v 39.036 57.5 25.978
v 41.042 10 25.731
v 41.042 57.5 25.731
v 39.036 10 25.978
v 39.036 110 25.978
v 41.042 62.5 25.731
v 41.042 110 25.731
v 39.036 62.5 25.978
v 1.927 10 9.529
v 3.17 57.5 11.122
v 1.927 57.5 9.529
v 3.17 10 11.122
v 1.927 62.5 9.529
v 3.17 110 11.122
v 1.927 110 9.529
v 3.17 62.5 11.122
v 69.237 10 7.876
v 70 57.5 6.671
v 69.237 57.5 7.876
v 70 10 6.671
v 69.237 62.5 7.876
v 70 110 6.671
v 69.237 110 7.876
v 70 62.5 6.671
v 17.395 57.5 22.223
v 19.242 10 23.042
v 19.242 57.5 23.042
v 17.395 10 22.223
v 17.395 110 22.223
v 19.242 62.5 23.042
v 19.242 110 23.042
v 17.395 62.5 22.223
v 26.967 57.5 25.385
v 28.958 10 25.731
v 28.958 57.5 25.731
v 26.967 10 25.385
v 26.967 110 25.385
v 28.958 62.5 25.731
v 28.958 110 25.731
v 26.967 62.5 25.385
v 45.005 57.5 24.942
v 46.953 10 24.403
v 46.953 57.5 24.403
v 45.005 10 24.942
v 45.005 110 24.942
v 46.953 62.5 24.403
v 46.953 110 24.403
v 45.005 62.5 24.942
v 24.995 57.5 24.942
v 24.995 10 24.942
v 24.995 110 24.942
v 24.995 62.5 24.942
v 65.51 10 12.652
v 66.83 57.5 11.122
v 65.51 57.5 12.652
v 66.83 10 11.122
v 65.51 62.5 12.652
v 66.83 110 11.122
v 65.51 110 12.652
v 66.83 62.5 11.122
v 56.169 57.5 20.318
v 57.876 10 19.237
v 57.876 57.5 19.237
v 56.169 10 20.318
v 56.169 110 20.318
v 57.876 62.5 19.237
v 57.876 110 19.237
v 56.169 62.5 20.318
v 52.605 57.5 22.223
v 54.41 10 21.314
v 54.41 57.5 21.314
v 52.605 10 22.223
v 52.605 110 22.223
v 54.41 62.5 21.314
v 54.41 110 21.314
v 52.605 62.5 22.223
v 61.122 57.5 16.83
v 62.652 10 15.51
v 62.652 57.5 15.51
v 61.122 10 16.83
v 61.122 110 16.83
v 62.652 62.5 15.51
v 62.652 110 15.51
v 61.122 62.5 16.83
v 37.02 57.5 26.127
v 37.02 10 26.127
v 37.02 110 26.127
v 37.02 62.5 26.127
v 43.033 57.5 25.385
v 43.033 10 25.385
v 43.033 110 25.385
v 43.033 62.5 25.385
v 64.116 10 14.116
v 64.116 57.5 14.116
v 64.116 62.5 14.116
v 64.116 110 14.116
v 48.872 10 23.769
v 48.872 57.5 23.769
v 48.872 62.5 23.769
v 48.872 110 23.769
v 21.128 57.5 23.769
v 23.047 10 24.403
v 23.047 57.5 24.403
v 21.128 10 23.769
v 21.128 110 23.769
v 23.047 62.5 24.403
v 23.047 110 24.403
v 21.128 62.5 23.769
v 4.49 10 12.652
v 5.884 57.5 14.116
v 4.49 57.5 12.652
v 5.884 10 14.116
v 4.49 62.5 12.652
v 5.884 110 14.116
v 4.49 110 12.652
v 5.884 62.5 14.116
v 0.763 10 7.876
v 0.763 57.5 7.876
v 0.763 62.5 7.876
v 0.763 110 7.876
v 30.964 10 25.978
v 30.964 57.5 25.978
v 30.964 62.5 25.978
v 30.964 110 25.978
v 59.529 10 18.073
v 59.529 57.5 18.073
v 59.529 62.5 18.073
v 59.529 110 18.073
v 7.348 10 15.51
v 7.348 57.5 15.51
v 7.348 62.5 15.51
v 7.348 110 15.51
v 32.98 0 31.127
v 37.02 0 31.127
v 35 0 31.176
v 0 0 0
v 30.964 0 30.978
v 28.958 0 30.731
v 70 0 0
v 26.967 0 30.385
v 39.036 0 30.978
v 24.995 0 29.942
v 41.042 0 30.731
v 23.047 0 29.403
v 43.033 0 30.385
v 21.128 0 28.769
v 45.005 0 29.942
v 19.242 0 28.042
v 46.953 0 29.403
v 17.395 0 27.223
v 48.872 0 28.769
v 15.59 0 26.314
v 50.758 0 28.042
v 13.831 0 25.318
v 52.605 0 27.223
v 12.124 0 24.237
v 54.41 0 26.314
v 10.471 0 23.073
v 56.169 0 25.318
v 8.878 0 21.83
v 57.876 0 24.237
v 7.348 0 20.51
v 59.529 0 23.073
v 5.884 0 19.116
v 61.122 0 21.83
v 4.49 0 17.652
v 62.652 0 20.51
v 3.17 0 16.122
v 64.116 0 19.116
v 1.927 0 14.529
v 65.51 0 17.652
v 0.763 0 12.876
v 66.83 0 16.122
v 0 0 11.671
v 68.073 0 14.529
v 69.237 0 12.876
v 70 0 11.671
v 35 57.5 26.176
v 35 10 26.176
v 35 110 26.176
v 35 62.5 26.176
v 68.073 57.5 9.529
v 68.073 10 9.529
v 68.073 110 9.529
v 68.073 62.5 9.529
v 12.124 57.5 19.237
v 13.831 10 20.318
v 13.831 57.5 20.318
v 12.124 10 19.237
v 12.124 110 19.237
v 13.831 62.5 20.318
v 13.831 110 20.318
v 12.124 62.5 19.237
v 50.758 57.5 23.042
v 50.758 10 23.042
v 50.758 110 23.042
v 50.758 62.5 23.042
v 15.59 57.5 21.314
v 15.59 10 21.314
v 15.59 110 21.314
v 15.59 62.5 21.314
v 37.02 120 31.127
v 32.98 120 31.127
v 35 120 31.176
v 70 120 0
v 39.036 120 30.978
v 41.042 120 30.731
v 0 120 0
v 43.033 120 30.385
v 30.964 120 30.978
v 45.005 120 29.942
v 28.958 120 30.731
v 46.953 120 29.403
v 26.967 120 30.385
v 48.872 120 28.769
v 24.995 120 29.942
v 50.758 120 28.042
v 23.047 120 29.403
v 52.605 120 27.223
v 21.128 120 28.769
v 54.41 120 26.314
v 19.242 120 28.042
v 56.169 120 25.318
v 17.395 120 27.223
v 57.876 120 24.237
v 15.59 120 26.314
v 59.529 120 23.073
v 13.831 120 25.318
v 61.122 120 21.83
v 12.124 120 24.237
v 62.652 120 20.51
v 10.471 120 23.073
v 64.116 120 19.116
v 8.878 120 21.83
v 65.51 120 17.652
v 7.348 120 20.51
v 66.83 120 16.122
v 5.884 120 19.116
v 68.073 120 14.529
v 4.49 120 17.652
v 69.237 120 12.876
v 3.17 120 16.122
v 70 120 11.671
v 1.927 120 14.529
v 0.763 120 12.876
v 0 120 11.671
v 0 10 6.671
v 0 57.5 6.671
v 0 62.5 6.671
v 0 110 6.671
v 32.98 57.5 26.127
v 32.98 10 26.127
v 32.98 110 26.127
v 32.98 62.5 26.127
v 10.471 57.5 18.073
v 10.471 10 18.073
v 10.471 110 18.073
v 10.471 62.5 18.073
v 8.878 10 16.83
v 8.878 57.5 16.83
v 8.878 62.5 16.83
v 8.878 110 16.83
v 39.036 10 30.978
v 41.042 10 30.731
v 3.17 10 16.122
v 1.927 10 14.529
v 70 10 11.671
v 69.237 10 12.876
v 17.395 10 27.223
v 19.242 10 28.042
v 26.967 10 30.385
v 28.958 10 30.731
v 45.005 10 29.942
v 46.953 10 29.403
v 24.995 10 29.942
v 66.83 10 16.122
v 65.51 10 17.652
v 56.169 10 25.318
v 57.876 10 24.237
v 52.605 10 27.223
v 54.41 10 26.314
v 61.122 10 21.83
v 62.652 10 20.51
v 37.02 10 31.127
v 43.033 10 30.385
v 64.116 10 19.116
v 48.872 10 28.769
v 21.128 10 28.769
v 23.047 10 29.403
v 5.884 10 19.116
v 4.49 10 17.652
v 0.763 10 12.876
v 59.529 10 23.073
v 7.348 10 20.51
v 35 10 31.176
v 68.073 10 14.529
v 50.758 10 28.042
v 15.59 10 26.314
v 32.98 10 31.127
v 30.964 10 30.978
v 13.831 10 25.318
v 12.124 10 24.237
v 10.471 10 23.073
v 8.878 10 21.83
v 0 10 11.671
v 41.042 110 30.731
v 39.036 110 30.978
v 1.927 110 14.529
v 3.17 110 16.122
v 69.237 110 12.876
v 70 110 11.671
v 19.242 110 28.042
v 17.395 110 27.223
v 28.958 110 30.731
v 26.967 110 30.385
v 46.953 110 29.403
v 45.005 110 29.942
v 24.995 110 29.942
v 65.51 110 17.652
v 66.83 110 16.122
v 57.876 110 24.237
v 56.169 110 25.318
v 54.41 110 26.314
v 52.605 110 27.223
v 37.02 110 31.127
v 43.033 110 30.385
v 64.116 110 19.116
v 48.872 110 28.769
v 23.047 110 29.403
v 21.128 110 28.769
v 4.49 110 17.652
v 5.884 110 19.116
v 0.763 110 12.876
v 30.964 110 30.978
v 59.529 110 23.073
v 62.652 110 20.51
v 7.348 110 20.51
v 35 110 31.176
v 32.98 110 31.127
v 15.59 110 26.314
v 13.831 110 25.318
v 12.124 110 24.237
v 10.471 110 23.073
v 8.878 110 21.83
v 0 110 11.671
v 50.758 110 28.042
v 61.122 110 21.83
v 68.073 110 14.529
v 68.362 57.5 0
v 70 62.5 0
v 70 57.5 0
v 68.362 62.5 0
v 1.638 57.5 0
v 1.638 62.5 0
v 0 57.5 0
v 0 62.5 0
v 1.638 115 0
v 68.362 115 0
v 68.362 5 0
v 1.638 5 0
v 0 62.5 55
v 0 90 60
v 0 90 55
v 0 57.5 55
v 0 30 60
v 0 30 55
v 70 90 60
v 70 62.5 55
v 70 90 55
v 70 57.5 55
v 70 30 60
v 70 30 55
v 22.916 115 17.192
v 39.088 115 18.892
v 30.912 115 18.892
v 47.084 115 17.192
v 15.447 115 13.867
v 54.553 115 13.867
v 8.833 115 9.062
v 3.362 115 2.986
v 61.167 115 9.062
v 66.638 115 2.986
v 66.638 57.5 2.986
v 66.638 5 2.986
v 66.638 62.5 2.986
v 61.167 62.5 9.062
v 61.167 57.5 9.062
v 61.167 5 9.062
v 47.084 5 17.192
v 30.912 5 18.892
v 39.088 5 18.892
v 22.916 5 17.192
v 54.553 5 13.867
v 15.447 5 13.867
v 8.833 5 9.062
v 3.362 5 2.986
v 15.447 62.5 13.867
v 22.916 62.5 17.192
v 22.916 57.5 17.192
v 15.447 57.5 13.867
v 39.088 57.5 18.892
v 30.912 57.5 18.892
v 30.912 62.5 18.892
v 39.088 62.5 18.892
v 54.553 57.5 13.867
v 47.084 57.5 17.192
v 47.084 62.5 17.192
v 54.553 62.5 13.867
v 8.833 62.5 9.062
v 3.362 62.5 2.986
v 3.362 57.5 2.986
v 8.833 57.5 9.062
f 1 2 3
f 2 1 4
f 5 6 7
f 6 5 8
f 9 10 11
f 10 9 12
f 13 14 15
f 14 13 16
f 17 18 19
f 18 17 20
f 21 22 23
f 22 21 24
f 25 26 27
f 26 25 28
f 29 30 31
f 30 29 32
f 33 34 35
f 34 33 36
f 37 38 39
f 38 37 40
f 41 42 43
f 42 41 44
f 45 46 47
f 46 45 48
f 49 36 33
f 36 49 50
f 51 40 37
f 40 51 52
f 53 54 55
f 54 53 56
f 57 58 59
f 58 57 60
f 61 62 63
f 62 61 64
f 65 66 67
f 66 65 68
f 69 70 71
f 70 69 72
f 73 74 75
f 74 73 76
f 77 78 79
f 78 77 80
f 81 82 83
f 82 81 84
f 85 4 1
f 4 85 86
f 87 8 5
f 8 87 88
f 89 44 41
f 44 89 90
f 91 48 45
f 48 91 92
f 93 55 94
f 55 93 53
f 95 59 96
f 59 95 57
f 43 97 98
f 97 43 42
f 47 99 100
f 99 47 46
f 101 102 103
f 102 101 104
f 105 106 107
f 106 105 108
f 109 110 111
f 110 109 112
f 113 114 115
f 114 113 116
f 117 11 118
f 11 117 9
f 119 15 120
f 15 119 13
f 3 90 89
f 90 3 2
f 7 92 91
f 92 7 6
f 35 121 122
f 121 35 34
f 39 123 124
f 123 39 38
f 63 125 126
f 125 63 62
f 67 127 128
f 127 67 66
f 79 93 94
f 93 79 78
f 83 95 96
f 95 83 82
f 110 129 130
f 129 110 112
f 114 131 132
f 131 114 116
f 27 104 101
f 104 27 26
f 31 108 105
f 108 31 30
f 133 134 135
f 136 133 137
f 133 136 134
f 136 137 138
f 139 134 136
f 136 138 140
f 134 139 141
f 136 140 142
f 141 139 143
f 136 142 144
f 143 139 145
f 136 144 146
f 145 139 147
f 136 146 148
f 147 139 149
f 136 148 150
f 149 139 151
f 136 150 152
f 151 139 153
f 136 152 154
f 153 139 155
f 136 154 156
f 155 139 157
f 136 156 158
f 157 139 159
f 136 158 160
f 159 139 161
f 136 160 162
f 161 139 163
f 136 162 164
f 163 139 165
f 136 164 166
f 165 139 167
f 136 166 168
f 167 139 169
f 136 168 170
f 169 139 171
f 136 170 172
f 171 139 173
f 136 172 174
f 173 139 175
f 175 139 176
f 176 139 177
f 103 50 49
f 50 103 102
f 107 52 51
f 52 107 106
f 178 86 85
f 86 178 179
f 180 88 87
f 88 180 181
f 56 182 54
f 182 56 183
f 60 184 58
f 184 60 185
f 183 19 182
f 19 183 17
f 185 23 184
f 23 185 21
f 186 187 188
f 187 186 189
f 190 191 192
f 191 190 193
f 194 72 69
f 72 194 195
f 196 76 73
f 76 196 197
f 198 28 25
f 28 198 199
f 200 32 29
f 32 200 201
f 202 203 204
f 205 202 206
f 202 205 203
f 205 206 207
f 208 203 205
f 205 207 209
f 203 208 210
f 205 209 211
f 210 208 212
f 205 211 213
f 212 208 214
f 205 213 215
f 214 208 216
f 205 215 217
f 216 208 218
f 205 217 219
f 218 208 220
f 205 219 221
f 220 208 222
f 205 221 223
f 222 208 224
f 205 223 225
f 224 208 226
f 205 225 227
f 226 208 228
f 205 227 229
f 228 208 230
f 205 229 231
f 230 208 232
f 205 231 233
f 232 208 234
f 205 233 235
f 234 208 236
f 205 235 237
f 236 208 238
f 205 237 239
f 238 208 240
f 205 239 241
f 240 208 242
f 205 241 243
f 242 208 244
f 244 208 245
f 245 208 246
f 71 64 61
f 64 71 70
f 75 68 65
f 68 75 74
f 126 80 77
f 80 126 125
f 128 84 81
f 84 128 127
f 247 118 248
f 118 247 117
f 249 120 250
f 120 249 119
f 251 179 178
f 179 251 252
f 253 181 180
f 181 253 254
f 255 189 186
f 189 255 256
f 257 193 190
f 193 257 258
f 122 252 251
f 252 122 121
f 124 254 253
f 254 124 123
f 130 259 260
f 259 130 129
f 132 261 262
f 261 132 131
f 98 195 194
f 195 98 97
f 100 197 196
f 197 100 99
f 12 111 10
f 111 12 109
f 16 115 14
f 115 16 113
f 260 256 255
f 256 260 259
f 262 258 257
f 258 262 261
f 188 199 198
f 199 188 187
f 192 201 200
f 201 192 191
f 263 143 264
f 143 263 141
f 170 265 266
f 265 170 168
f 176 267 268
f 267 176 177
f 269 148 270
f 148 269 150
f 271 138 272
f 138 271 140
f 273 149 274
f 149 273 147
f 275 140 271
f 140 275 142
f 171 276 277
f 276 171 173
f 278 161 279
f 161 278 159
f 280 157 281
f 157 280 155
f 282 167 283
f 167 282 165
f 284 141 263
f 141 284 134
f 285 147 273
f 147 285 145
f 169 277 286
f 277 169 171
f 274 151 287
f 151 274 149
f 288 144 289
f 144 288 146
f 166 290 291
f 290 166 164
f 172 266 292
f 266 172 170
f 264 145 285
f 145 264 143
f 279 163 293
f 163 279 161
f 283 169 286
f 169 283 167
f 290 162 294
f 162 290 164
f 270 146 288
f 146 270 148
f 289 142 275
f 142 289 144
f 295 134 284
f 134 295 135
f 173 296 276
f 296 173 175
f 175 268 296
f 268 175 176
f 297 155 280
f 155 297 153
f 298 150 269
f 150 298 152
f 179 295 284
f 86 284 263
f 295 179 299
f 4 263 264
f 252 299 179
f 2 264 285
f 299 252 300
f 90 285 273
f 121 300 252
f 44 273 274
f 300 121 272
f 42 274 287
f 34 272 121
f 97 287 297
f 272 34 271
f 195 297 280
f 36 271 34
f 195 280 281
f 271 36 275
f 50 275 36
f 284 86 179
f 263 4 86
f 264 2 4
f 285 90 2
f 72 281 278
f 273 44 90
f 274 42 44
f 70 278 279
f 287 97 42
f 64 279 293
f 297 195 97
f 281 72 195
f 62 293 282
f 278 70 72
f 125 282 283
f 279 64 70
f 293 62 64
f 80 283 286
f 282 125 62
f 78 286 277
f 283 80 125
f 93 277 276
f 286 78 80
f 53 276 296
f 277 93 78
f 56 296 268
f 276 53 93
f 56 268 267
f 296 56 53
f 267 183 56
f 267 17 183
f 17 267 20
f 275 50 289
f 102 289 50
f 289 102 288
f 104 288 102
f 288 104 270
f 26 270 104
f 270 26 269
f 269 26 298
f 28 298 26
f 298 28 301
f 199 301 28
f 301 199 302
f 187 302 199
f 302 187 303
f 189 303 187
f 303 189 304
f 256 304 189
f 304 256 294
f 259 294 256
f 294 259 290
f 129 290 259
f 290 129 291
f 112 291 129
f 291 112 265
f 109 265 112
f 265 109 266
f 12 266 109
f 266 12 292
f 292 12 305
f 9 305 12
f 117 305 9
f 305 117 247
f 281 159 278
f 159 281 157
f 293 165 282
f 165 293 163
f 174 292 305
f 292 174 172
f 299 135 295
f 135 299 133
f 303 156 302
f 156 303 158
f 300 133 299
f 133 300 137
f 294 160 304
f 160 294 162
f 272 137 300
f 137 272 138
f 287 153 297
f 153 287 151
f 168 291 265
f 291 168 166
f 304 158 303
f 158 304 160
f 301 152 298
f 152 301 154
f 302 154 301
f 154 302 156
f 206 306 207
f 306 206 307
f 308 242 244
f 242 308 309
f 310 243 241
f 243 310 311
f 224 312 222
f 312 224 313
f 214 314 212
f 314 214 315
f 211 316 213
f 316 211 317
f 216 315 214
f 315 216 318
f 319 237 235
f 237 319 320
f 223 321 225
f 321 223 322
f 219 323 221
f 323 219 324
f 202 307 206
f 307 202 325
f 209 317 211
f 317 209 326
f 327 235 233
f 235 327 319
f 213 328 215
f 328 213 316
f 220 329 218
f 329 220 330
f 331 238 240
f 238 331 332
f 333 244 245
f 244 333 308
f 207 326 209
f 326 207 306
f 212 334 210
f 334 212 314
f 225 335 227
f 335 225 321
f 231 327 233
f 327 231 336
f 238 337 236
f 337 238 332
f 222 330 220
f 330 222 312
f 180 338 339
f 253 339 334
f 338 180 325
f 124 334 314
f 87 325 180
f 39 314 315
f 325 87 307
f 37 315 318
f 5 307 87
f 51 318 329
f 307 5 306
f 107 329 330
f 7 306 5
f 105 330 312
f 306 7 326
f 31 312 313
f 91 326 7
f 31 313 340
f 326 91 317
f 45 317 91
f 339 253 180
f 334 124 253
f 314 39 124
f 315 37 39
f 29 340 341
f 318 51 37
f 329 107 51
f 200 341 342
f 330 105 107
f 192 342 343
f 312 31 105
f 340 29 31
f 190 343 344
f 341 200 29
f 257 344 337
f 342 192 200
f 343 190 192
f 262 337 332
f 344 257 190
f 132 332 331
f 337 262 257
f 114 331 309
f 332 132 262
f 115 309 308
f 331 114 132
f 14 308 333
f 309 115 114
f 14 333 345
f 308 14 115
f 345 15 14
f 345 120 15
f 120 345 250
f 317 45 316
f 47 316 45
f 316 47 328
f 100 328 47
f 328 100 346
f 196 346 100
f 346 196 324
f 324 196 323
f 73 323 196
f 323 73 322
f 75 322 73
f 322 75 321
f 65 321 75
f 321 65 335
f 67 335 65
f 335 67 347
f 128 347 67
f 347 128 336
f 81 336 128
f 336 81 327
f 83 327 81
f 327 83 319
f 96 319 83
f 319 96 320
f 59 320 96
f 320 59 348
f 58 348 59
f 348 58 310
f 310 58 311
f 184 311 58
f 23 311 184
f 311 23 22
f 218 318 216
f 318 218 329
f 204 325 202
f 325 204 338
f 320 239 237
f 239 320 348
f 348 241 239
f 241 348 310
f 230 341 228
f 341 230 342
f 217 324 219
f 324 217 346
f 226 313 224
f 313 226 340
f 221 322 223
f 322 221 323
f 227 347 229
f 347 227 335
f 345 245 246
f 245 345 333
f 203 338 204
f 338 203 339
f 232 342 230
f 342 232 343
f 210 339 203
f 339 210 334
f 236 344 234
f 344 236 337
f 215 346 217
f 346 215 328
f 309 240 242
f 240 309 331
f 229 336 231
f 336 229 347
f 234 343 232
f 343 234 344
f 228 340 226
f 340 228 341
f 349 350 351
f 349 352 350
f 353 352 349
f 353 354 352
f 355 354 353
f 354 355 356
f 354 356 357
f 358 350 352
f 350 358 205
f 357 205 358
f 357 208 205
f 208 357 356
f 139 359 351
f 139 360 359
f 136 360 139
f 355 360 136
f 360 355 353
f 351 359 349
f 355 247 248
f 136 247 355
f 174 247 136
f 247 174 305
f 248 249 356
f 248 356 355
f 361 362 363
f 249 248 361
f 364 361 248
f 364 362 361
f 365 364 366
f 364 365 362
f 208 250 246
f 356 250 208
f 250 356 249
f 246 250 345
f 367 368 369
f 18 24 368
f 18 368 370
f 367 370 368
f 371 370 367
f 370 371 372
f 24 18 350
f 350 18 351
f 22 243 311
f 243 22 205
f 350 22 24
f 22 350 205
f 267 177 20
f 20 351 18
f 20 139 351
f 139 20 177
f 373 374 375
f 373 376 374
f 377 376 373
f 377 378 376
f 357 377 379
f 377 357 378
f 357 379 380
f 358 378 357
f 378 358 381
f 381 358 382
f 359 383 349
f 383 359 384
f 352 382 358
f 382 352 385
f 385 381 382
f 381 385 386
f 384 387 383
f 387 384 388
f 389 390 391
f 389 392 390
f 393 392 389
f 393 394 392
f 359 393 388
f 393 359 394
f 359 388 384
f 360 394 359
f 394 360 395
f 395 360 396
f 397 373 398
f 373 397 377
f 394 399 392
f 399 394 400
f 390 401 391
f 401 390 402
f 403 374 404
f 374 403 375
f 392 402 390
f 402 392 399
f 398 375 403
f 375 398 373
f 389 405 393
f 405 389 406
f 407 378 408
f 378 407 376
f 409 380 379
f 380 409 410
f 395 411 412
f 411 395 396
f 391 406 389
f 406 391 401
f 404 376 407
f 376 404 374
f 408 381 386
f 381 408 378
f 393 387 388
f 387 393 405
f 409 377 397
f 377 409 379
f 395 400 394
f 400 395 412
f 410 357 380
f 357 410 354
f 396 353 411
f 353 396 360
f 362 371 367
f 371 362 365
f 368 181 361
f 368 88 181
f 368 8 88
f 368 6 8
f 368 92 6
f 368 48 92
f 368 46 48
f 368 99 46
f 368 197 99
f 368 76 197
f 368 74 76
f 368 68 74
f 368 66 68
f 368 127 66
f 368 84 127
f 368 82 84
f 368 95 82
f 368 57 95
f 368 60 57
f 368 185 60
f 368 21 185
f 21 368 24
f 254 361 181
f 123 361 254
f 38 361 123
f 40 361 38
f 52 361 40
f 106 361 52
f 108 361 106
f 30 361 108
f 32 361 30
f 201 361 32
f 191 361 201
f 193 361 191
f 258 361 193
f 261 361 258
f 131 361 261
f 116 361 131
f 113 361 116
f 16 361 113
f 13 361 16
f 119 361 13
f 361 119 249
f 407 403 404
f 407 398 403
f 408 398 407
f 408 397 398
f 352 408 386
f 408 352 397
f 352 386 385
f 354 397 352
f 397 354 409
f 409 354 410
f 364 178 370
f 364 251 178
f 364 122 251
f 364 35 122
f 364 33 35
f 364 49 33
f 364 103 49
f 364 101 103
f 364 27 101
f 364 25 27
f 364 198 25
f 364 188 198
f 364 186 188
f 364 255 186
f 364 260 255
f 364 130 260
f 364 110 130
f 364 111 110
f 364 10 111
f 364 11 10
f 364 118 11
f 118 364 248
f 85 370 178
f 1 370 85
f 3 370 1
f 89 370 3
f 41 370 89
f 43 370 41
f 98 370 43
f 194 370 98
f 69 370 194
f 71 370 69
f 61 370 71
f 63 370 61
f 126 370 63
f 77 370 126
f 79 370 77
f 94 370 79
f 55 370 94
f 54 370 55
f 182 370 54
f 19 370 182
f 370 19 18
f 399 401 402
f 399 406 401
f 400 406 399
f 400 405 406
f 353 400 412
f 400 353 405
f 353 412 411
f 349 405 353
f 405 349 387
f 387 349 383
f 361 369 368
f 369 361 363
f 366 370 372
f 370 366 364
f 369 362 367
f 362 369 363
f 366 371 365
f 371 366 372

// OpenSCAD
width = 70;
length = 120;
thicc = 5;
height = 60;


//Mid connector
translate([0,length/2-thicc/2,0])
    cube([width,thicc,height]);
//Top

translate([0,length/4,height-thicc])    
    cube([width,length/2,thicc]);


difference(){
    union(){
        //Base
        translate([width/2,0,-15])
        rotate([-90,0,0])
        cylinder(h=length,r=width/1.7,$fn=128);
        //1st bump
        translate([width/2,0,-10])
        rotate([-90,0,0])
        cylinder(h=10,r=width/1.7,$fn=128);
        //2nd bump
        translate([width/2,length-10,-10])
        rotate([-90,0,0])
        cylinder(h=10,r=width/1.7,$fn=128);
        //Buttom
        cube([width,length,thicc]);
}
    
    //Cut buttom
    translate([-15,-5,-100])
    cube([width*2,length+10,+100]);
    //Cut left side
    translate([-20,-5,-3])
    cube([20,length+10,15]);
    //Cut right side
    translate([width,-5,-3])
    cube([20,length+10,15]);
    
    //cut inside
    translate([width/2,thicc,-15-thicc])
    rotate([-90,0,0])
    cylinder(h=length-thicc*2,r=width/1.79);
}

  
